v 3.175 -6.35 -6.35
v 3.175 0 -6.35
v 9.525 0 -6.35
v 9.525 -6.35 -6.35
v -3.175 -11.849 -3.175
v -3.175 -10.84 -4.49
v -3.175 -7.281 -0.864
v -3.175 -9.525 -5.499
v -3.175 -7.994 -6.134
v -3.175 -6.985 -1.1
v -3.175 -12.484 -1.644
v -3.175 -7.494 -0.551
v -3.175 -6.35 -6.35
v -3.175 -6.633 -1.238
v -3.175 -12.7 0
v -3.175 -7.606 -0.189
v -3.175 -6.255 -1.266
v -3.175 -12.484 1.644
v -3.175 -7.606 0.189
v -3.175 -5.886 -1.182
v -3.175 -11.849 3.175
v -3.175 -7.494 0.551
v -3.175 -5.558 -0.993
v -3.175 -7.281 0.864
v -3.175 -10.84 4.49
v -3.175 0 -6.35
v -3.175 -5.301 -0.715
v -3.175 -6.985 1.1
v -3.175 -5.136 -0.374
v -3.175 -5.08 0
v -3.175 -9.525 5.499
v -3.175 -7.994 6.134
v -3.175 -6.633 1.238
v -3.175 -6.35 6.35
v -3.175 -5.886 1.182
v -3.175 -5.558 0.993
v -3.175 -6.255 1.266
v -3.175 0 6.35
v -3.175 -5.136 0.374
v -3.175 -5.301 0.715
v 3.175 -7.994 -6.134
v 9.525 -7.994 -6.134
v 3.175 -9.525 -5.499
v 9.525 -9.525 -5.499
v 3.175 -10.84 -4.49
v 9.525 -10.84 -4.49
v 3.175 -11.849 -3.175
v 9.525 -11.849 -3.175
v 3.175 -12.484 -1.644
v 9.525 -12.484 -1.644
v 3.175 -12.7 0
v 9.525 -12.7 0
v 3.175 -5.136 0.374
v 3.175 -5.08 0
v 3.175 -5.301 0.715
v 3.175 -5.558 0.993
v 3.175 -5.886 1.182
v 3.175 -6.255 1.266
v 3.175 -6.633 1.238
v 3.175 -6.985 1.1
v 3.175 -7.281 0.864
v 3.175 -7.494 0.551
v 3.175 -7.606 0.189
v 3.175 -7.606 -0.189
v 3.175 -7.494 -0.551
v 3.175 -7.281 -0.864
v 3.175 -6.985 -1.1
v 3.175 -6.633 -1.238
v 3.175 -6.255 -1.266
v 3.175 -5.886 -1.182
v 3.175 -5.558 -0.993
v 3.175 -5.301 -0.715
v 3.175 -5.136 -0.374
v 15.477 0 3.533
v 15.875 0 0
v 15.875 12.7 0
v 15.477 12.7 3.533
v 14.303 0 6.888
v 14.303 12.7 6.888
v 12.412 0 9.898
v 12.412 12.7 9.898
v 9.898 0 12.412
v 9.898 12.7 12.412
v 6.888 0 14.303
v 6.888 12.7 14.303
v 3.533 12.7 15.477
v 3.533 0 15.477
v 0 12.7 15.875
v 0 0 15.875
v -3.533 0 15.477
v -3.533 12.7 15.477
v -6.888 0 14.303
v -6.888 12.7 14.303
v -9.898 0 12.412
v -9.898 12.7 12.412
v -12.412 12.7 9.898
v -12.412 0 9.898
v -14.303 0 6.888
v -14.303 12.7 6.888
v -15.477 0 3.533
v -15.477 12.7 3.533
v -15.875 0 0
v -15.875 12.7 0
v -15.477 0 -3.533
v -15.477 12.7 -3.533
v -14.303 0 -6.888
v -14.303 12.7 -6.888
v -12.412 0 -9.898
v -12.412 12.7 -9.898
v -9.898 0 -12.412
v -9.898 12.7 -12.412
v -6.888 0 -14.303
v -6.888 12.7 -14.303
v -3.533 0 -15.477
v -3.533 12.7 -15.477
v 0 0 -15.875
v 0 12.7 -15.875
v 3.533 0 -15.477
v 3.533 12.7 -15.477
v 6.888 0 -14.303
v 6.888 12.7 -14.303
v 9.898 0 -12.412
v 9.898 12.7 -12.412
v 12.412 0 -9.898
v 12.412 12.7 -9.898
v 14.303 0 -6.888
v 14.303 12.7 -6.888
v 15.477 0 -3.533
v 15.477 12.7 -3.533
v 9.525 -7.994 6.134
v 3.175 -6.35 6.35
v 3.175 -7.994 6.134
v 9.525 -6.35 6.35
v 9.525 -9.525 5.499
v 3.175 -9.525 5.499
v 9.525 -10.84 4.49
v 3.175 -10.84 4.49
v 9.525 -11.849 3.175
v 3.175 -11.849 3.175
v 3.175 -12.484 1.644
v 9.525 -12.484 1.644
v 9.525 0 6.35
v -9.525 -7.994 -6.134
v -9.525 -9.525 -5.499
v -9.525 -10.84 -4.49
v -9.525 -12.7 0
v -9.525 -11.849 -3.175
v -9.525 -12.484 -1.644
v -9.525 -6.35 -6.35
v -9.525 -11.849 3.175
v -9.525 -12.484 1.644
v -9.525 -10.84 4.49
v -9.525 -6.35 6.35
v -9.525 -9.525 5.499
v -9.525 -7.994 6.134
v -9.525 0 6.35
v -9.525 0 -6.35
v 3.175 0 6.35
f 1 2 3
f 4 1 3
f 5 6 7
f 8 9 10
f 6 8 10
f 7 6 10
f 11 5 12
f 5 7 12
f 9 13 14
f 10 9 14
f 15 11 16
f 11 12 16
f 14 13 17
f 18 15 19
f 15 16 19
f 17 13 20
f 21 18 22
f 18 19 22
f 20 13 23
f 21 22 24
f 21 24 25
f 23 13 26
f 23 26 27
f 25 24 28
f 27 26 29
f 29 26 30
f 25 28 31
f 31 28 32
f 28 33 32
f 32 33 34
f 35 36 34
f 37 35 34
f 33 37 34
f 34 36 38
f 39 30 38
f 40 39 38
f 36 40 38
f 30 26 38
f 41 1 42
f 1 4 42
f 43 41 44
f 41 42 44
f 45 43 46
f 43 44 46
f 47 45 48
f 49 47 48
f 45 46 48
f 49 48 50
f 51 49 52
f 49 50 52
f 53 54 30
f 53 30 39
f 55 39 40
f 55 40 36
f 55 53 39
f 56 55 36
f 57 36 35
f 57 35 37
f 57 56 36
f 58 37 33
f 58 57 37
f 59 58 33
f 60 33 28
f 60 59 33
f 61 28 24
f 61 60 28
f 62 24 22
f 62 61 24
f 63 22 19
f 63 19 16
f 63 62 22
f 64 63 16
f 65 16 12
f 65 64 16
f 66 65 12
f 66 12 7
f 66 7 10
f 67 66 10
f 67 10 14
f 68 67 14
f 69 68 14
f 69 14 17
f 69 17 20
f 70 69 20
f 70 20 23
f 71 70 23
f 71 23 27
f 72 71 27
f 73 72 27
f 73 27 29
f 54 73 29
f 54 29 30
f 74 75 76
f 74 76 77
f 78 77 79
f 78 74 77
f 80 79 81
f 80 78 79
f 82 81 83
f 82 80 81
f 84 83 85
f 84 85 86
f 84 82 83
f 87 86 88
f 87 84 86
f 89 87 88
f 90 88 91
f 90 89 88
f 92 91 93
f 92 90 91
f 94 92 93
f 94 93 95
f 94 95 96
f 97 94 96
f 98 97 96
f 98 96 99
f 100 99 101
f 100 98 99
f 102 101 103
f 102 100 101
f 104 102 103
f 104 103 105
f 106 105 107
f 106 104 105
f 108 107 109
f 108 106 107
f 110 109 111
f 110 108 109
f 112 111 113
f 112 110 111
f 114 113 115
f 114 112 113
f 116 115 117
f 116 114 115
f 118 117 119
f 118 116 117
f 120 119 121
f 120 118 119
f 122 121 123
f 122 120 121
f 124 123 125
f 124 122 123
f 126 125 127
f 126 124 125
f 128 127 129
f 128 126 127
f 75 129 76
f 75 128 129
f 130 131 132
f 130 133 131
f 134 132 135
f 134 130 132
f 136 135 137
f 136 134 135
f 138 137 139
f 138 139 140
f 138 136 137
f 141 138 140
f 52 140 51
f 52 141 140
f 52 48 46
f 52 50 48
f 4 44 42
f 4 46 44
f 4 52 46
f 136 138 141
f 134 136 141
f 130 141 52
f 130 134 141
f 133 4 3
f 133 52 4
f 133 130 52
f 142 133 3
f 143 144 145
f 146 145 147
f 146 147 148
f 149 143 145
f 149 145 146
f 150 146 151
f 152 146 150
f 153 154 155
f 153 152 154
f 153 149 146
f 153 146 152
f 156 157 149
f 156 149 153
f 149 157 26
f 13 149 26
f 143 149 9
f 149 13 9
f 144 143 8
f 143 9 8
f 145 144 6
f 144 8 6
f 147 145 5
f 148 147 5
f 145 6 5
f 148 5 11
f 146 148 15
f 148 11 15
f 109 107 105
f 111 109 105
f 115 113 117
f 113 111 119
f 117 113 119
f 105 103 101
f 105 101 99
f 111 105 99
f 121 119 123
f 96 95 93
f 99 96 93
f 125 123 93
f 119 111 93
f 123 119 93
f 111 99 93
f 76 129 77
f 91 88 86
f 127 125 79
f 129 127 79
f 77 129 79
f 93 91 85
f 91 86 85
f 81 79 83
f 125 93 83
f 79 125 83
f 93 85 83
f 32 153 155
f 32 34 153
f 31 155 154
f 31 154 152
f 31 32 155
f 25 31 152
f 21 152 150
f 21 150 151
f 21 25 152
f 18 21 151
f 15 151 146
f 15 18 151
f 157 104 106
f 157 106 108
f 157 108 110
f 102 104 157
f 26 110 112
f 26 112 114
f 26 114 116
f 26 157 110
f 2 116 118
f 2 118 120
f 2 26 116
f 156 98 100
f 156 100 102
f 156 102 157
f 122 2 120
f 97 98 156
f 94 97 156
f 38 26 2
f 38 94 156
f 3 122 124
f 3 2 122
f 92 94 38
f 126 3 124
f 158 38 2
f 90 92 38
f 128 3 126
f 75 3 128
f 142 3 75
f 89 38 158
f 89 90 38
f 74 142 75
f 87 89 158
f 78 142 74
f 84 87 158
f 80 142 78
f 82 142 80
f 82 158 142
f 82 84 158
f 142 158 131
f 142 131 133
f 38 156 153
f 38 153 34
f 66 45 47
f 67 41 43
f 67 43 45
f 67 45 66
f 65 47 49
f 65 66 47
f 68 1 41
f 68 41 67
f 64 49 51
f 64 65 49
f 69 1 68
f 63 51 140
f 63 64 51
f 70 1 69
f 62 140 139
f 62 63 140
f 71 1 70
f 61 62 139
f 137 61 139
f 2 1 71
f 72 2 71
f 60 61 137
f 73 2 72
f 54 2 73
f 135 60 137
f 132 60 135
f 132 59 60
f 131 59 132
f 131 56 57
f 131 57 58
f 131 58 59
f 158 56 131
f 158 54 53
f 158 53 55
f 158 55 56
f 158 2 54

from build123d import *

# Parameters (mm, degrees)
F0_R     = 15.875
F1_DEPTH = 12.7
F2_W     = 6.35
F2_H     = 12.7
F3_DEPTH = 12.7
F4_R     = 6.34999
F5_R     = 1.27
F6_DEPTH = 19.05


# Not quite as in the source:
# - a fillet or chamfer is up to 0.001 mm smaller than in the source, because OpenCascade refuses the exact size


with BuildPart() as f1:
    # F0 (on Front) → F1 (new body)
    with BuildSketch(Plane.XZ):
        Circle(F0_R)
    extrude(amount=-F1_DEPTH)

    # F2 (on face) → F3 (join)
    with BuildSketch(Plane.XZ):
        with Locations((-6.35, 0)):
            Rectangle(F2_W, F2_H)
        with Locations((6.35, 0)):
            Rectangle(F2_W, F2_H)
    extrude(amount=F3_DEPTH)

    # F4 (radius 6.35 in the source; OpenCascade refuses exactly that, so slightly less here)
    f4_edges = [f1.edges().sort_by_distance(p)[0] for p in [
        (-6.35, -12.7, 6.35),
        (6.35, -12.7, 6.35),
        (-6.35, -12.7, -6.35),
        (6.35, -12.7, -6.35),
    ]]
    fillet(f4_edges, radius=F4_R)

    # F5 (on face) → F6 (join)
    with BuildSketch(Plane.YZ.offset(9.525)):
        with Locations((-6.35, 0)):
            Circle(F5_R)
    extrude(amount=-F6_DEPTH)


solid = f1.part
